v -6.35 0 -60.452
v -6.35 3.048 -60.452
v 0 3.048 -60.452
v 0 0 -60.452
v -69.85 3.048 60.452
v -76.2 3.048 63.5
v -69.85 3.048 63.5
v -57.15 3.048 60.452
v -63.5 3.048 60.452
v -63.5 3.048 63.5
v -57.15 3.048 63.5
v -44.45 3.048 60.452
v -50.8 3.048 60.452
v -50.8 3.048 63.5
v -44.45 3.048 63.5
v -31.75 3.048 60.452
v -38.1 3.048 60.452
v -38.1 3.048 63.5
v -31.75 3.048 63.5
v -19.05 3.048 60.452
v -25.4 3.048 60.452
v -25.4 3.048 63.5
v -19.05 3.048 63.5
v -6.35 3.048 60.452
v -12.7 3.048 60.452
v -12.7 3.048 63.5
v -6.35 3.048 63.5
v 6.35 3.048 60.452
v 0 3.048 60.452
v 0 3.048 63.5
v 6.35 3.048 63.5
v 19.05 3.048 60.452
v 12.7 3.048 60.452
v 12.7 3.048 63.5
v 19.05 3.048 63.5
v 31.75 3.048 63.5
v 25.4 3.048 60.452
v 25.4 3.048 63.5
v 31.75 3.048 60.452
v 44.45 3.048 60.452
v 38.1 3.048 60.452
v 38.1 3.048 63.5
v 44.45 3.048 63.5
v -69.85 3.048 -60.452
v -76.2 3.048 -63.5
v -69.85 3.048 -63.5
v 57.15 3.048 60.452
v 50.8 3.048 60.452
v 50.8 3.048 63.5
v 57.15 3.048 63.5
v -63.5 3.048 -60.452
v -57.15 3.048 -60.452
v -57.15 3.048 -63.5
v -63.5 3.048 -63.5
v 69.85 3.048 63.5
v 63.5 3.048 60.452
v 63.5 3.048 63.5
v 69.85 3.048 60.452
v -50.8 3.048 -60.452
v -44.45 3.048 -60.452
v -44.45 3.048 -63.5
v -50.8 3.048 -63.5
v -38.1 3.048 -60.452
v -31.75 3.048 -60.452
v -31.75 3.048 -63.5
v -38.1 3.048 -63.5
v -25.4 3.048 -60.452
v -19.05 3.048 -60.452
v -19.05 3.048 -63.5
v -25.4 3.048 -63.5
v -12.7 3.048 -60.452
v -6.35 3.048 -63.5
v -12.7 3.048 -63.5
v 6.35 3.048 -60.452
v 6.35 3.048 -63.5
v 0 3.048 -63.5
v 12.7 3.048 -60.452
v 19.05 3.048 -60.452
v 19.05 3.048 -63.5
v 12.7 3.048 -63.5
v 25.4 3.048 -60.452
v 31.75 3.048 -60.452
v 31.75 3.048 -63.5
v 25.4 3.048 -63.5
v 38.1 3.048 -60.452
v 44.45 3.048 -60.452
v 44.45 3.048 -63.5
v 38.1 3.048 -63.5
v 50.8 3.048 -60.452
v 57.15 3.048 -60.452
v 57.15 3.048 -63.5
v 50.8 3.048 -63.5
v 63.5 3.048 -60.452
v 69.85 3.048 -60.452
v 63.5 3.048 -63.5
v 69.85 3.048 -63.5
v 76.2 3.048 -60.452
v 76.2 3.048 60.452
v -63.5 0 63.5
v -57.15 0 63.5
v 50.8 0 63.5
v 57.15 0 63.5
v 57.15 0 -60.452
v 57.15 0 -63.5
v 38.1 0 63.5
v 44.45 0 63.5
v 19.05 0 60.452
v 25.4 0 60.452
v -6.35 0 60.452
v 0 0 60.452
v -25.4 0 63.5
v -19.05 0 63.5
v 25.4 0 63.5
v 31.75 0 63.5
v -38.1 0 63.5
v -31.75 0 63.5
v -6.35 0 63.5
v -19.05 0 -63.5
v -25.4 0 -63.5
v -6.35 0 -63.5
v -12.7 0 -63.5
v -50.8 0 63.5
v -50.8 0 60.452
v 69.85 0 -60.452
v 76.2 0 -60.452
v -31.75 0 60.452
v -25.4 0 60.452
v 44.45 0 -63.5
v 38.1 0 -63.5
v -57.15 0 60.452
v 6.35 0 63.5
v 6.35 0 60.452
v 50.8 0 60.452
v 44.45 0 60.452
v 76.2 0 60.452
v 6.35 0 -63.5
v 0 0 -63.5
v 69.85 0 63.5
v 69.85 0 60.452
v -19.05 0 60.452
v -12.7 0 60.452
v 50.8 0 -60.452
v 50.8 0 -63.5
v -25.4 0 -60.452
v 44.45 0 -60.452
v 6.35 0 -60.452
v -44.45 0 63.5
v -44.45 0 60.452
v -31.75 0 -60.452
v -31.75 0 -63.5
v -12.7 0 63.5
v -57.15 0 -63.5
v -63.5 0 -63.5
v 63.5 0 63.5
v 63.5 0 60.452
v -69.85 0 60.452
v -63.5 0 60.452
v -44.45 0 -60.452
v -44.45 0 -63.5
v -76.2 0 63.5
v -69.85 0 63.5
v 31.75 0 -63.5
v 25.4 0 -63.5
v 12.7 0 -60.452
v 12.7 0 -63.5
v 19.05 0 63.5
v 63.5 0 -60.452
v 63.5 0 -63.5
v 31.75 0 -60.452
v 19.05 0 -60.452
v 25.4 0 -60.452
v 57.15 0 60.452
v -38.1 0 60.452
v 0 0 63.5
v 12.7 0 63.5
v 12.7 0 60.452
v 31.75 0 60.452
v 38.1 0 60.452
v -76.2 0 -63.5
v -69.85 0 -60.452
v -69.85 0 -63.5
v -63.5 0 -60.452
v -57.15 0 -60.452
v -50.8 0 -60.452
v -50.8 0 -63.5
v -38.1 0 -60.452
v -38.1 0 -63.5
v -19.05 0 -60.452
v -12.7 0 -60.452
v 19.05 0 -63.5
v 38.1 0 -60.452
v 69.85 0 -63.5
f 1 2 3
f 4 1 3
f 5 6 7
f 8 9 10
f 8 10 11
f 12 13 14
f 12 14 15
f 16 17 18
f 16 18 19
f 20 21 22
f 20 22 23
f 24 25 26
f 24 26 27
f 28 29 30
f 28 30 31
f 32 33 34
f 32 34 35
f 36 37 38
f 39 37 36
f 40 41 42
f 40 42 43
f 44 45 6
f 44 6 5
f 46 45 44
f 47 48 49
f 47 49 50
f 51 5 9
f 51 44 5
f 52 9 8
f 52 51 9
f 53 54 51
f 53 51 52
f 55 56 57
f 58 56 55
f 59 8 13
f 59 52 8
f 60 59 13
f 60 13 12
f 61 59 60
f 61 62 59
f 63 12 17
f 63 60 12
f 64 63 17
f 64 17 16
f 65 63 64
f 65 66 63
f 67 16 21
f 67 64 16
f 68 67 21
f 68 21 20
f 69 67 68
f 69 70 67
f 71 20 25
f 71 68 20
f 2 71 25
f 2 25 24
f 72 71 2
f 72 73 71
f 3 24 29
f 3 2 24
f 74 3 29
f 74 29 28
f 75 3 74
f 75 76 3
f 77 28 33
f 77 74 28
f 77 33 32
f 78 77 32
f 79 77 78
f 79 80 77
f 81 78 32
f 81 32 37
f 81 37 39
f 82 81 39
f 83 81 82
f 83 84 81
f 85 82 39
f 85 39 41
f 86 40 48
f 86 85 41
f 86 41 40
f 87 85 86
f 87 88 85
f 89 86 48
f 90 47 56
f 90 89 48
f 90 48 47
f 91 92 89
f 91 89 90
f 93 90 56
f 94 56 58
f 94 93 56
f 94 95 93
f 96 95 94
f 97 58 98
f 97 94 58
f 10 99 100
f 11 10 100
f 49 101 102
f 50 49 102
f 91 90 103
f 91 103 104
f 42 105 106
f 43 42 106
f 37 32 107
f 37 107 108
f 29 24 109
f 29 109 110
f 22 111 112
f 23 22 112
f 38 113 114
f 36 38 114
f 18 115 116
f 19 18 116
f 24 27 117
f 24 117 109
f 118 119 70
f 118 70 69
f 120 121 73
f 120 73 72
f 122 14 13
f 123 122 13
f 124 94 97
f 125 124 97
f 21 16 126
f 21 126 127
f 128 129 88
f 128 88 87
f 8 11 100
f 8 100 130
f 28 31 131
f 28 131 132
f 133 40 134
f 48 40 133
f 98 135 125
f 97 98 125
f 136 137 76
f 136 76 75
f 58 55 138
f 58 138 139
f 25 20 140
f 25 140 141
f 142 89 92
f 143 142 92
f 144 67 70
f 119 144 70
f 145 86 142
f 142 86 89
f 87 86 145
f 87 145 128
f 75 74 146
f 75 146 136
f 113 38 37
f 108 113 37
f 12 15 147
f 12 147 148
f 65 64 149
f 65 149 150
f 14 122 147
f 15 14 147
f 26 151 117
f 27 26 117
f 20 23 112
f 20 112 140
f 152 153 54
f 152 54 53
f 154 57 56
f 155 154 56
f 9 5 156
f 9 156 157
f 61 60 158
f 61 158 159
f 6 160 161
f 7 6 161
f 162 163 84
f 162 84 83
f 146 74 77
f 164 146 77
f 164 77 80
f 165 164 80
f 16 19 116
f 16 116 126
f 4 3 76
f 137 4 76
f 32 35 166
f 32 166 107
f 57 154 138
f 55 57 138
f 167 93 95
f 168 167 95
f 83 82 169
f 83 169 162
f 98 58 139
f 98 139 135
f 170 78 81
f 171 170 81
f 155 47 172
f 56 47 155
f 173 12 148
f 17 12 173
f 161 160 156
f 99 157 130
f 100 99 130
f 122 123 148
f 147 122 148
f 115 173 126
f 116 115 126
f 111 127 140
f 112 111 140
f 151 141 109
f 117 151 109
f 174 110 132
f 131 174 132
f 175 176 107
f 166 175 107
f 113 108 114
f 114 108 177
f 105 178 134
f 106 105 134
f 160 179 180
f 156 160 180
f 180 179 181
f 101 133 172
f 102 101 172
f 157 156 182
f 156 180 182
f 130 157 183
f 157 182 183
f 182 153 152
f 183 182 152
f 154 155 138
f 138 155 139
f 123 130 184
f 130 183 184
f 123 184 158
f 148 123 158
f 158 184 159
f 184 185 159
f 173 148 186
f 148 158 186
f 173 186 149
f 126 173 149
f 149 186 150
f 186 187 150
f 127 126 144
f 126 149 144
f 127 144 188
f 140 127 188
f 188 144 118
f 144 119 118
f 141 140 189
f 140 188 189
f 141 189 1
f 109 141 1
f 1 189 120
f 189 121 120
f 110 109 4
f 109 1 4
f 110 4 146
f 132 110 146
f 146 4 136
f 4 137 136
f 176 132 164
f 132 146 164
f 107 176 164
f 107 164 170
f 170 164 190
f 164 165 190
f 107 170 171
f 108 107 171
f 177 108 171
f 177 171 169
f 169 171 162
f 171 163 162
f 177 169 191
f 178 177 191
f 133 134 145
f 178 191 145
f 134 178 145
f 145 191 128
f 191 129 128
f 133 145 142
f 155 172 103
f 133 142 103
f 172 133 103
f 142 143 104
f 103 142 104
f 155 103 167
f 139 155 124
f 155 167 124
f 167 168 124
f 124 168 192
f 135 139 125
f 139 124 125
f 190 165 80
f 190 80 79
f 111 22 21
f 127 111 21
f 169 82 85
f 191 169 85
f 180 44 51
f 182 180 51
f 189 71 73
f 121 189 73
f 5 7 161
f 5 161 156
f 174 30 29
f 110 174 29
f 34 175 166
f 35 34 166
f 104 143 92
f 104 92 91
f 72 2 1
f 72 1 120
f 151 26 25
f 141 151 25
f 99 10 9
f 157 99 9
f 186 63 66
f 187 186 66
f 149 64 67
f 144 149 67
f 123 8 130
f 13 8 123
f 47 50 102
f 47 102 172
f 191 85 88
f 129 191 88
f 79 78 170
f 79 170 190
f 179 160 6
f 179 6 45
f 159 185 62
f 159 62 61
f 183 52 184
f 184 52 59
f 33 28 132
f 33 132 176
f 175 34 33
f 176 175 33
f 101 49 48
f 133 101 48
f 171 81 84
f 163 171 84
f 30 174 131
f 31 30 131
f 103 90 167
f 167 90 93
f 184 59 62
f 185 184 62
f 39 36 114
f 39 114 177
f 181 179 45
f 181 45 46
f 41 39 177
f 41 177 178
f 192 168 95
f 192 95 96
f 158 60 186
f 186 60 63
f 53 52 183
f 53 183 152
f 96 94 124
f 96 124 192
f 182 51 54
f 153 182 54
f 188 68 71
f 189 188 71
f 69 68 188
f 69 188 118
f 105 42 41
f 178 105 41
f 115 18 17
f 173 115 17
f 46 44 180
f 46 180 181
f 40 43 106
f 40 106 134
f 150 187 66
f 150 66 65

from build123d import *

# Parameters (mm, degrees)
SKETCH1_W           = 152.4
SKETCH1_H           = 127
BOSS_EXTRUDE1_DEPTH = 3.048
SKETCH2_W           = 6.35
SKETCH2_H           = 3.048
CUT_EXTRUDE1_DEPTH  = 100.236990603


with BuildPart() as part:
    # Sketch1 → Boss-Extrude1 (new body)
    with BuildSketch(Plane(origin=(0, 0, 0), x_dir=(1, 0, 0), z_dir=(0, 1, 0))):
        Rectangle(SKETCH1_W, SKETCH1_H)
    extrude(amount=BOSS_EXTRUDE1_DEPTH)

    # Sketch2 → Cut-Extrude1 (cut, through all)
    with BuildSketch(Plane(origin=(0, 3.048, 0), x_dir=(1, 0, 0), z_dir=(0, 1, 0))):
        with Locations((-66.675, -61.976)):
            Rectangle(SKETCH2_W, SKETCH2_H)
        with Locations((-53.975, -61.976)):
            Rectangle(SKETCH2_W, SKETCH2_H)
        with Locations((-41.275, -61.976)):
            Rectangle(SKETCH2_W, SKETCH2_H)
        with Locations((-28.575, -61.976)):
            Rectangle(SKETCH2_W, SKETCH2_H)
        with Locations((-15.875, -61.976)):
            Rectangle(SKETCH2_W, SKETCH2_H)
        with Locations((-3.175, -61.976)):
            Rectangle(SKETCH2_W, SKETCH2_H)
        with Locations((9.525, -61.976)):
            Rectangle(SKETCH2_W, SKETCH2_H)
        with Locations((22.225, -61.976)):
            Rectangle(SKETCH2_W, SKETCH2_H)
        with Locations((47.625, -61.976)):
            Rectangle(SKETCH2_W, SKETCH2_H)
        with Locations((60.325, -61.976)):
            Rectangle(SKETCH2_W, SKETCH2_H)
        with Locations((34.925, -61.976)):
            Rectangle(SKETCH2_W, SKETCH2_H)
        with Locations((73.025, -61.976)):
            Rectangle(SKETCH2_W, SKETCH2_H)
        with Locations((-66.675, 61.976)):
            Rectangle(SKETCH2_W, SKETCH2_H)
        with Locations((-53.975, 61.976)):
            Rectangle(SKETCH2_W, SKETCH2_H)
        with Locations((-41.275, 61.976)):
            Rectangle(SKETCH2_W, SKETCH2_H)
        with Locations((-28.575, 61.976)):
            Rectangle(SKETCH2_W, SKETCH2_H)
        with Locations((-15.875, 61.976)):
            Rectangle(SKETCH2_W, SKETCH2_H)
        with Locations((-3.175, 61.976)):
            Rectangle(SKETCH2_W, SKETCH2_H)
        with Locations((9.525, 61.976)):
            Rectangle(SKETCH2_W, SKETCH2_H)
        with Locations((22.225, 61.976)):
            Rectangle(SKETCH2_W, SKETCH2_H)
        with Locations((34.925, 61.976)):
            Rectangle(SKETCH2_W, SKETCH2_H)
        with Locations((47.625, 61.976)):
            Rectangle(SKETCH2_W, SKETCH2_H)
        with Locations((60.325, 61.976)):
            Rectangle(SKETCH2_W, SKETCH2_H)
        with Locations((73.025, 61.976)):
            Rectangle(SKETCH2_W, SKETCH2_H)
    extrude(amount=-CUT_EXTRUDE1_DEPTH, mode=Mode.SUBTRACT)


solid = part.part
